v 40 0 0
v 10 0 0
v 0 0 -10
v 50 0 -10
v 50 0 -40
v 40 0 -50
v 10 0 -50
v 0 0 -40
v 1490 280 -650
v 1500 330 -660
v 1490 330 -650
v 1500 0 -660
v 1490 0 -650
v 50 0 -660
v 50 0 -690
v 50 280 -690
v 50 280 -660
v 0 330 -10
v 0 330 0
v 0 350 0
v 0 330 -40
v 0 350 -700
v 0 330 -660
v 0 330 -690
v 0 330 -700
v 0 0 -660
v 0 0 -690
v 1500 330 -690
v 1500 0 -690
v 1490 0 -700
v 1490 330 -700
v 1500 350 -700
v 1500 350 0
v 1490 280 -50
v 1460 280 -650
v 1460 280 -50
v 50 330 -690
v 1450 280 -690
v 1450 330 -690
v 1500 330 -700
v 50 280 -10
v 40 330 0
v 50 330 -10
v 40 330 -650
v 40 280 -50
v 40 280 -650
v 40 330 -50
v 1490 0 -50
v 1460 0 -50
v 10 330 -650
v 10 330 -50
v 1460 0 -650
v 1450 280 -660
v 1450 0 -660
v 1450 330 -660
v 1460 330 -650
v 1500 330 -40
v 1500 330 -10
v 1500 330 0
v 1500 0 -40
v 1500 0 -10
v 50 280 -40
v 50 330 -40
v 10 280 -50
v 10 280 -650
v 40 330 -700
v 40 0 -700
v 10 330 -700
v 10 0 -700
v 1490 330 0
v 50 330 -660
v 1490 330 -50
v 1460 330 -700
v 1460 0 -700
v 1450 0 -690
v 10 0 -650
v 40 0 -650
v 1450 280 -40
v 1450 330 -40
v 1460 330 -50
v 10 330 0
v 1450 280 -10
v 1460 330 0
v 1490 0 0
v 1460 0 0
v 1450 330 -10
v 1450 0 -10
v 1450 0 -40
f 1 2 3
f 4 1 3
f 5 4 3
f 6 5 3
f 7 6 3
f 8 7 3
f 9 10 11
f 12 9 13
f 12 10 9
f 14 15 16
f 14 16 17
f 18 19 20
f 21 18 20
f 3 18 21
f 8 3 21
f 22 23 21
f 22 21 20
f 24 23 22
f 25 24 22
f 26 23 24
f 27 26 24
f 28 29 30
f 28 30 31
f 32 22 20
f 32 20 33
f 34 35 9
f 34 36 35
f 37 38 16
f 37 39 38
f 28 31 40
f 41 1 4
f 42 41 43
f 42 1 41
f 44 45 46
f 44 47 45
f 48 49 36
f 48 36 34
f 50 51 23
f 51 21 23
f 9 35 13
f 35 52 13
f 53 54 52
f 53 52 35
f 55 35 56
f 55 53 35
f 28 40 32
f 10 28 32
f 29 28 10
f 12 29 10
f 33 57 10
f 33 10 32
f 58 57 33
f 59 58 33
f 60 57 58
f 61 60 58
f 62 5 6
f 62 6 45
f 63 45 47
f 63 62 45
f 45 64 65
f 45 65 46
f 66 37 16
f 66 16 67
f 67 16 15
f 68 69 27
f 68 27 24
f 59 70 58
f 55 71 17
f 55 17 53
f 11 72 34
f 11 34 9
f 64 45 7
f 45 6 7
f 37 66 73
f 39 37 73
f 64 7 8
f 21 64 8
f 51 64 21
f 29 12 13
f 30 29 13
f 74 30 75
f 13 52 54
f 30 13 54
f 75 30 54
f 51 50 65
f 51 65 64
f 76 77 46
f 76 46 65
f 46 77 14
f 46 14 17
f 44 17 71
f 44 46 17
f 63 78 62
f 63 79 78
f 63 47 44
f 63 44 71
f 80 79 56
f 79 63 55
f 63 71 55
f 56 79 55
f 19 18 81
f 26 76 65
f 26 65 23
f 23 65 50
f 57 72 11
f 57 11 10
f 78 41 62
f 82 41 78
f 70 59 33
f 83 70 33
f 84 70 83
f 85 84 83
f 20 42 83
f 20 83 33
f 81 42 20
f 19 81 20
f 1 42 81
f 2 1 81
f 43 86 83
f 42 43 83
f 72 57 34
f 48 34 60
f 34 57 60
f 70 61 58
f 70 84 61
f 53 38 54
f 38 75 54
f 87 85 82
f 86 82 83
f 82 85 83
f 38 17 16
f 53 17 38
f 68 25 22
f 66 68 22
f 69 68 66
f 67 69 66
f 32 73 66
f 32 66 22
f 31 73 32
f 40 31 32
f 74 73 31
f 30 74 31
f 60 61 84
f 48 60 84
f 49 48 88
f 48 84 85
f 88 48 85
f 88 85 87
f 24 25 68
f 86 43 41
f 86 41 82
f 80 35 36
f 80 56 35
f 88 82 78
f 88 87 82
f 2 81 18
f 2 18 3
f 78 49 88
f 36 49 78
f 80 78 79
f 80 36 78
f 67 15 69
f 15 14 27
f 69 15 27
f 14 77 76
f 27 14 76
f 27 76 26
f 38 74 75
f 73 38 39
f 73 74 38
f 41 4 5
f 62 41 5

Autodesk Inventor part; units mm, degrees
ref_plane "YZ Plane" through (0, 0, 0) normal (1, 0, 0) x (0, 1, 0)
ref_plane "XZ Plane" through (0, 0, 0) normal (0, 1, 0) x (-1, 0, 0)
ref_plane "XY Plane" through (0, 0, 0) normal (0, 0, 1) x (1, 0, 0)
sketch "Sketch1" plane through (0, 0, 0) normal (0, 1, 0) x (-1, 0, 0)
  line L0 (0, 0) -> (-50, 0)
  line L1 (-50, 0) -> (-50, -50)
  line L2 (-50, -50) -> (0, -50)
  line L3 (0, -50) -> (0, 0)
  line L4 (0, 0) -> (-1500, 0)
  line L5 (-1500, 0) -> (-1500, -700)
  line L6 (-1500, -700) -> (0, -700)
  line L7 (0, -700) -> (0, 0)
  line L8 (0, -700) -> (-50, -700)
  line L9 (-50, -700) -> (-50, -650)
  line L10 (-50, -650) -> (0, -650)
  line L11 (0, -650) -> (0, -700)
  line L12 (-1500, -700) -> (-1450, -700)
  line L13 (-1450, -700) -> (-1450, -650)
  line L14 (-1450, -650) -> (-1500, -650)
  line L15 (-1500, -650) -> (-1500, -700)
  line L16 (-1500, 0) -> (-1450, 0)
  line L17 (-1450, 0) -> (-1450, -50)
  line L18 (-1450, -50) -> (-1500, -50)
  line L19 (-1500, -50) -> (-1500, 0)
  point P0 (-1500, -50)
  point P1 (-1450, 0)
  point P2 (0, -650)
  dimension "d0" = 50
  dimension "d1" = 50
  dimension "d2" = 1500
  dimension "d3" = 700
  dimension "d4" = 50
  dimension "d5" = 50
  dimension "d6" = 50
  dimension "d7" = 50
  dimension "d8" = 50
  dimension "d9" = 50
extrude "Extrusion1" add sketch "Sketch1" along normal blind 330 contours L3 L2 L1 L0 | L17 L18 L5 L4 | L7 L6 L9 L10 | L14 L13 L6 L5
sketch "Sketch2" plane through (0, 330, 0) normal (0, 1, 0) x (1, 0, 0)
  line L0 (50, 700) -> (0, 700) projected
  line L1 (0, 700) -> (1500, 700)
  line L2 (1500, 700) -> (1500, 0)
  line L3 (1500, 0) -> (0, 0)
  line L4 (0, 0) -> (0, 700)
chamfer "Chamfer1" distance 10 angle 45 16 edges at (0, 165, -650) (50, 165, -650) (50, 165, -700) (0, 165, -700) (1450, 165, -650) (1450, 165, -700) (1500, 165, -700) (1500, 165, -650) (1450, 165, 0) (1500, 165, -50) (1500, 165, 0) (1450, 165, -50) (0, 165, -50) (0, 165, 0) (50, 165, 0) (50, 165, -50)
extrude "Extrusion2" add sketch "Sketch2" along normal blind 20
sketch "Sketch3" plane through (0, 330, 0) normal (0, -1, 0) x (1, 0, 0)
  line L0 (50, -10) -> (50, -40) projected
  line L1 (1450, -40) -> (1450, -10) projected
  line L2 (50, -10) -> (1450, -10)
  line L3 (1450, -10) -> (1450, -40)
  line L4 (1450, -40) -> (50, -40)
  line L5 (50, -40) -> (50, -10)
  line L6 (1490, -50) -> (1460, -50) projected
  line L7 (1460, -650) -> (1490, -650) projected
  line L8 (1460, -50) -> (1490, -50)
  line L9 (1490, -50) -> (1490, -650)
  line L10 (1490, -650) -> (1460, -650)
  line L11 (1460, -650) -> (1460, -50)
  line L12 (50, -660) -> (1450, -660)
  line L13 (1450, -660) -> (1450, -690)
  line L14 (1450, -690) -> (50, -690)
  line L15 (50, -690) -> (50, -660)
  line L16 (40, -50) -> (10, -50) projected
  line L17 (10, -50) -> (40, -50)
  line L18 (40, -50) -> (40, -650)
  line L19 (40, -650) -> (10, -650)
  line L20 (10, -650) -> (10, -50)
  point P0 (0, 0)
extrude "Extrusion3" add sketch "Sketch3" along normal blind 50
properties part number "Table"
